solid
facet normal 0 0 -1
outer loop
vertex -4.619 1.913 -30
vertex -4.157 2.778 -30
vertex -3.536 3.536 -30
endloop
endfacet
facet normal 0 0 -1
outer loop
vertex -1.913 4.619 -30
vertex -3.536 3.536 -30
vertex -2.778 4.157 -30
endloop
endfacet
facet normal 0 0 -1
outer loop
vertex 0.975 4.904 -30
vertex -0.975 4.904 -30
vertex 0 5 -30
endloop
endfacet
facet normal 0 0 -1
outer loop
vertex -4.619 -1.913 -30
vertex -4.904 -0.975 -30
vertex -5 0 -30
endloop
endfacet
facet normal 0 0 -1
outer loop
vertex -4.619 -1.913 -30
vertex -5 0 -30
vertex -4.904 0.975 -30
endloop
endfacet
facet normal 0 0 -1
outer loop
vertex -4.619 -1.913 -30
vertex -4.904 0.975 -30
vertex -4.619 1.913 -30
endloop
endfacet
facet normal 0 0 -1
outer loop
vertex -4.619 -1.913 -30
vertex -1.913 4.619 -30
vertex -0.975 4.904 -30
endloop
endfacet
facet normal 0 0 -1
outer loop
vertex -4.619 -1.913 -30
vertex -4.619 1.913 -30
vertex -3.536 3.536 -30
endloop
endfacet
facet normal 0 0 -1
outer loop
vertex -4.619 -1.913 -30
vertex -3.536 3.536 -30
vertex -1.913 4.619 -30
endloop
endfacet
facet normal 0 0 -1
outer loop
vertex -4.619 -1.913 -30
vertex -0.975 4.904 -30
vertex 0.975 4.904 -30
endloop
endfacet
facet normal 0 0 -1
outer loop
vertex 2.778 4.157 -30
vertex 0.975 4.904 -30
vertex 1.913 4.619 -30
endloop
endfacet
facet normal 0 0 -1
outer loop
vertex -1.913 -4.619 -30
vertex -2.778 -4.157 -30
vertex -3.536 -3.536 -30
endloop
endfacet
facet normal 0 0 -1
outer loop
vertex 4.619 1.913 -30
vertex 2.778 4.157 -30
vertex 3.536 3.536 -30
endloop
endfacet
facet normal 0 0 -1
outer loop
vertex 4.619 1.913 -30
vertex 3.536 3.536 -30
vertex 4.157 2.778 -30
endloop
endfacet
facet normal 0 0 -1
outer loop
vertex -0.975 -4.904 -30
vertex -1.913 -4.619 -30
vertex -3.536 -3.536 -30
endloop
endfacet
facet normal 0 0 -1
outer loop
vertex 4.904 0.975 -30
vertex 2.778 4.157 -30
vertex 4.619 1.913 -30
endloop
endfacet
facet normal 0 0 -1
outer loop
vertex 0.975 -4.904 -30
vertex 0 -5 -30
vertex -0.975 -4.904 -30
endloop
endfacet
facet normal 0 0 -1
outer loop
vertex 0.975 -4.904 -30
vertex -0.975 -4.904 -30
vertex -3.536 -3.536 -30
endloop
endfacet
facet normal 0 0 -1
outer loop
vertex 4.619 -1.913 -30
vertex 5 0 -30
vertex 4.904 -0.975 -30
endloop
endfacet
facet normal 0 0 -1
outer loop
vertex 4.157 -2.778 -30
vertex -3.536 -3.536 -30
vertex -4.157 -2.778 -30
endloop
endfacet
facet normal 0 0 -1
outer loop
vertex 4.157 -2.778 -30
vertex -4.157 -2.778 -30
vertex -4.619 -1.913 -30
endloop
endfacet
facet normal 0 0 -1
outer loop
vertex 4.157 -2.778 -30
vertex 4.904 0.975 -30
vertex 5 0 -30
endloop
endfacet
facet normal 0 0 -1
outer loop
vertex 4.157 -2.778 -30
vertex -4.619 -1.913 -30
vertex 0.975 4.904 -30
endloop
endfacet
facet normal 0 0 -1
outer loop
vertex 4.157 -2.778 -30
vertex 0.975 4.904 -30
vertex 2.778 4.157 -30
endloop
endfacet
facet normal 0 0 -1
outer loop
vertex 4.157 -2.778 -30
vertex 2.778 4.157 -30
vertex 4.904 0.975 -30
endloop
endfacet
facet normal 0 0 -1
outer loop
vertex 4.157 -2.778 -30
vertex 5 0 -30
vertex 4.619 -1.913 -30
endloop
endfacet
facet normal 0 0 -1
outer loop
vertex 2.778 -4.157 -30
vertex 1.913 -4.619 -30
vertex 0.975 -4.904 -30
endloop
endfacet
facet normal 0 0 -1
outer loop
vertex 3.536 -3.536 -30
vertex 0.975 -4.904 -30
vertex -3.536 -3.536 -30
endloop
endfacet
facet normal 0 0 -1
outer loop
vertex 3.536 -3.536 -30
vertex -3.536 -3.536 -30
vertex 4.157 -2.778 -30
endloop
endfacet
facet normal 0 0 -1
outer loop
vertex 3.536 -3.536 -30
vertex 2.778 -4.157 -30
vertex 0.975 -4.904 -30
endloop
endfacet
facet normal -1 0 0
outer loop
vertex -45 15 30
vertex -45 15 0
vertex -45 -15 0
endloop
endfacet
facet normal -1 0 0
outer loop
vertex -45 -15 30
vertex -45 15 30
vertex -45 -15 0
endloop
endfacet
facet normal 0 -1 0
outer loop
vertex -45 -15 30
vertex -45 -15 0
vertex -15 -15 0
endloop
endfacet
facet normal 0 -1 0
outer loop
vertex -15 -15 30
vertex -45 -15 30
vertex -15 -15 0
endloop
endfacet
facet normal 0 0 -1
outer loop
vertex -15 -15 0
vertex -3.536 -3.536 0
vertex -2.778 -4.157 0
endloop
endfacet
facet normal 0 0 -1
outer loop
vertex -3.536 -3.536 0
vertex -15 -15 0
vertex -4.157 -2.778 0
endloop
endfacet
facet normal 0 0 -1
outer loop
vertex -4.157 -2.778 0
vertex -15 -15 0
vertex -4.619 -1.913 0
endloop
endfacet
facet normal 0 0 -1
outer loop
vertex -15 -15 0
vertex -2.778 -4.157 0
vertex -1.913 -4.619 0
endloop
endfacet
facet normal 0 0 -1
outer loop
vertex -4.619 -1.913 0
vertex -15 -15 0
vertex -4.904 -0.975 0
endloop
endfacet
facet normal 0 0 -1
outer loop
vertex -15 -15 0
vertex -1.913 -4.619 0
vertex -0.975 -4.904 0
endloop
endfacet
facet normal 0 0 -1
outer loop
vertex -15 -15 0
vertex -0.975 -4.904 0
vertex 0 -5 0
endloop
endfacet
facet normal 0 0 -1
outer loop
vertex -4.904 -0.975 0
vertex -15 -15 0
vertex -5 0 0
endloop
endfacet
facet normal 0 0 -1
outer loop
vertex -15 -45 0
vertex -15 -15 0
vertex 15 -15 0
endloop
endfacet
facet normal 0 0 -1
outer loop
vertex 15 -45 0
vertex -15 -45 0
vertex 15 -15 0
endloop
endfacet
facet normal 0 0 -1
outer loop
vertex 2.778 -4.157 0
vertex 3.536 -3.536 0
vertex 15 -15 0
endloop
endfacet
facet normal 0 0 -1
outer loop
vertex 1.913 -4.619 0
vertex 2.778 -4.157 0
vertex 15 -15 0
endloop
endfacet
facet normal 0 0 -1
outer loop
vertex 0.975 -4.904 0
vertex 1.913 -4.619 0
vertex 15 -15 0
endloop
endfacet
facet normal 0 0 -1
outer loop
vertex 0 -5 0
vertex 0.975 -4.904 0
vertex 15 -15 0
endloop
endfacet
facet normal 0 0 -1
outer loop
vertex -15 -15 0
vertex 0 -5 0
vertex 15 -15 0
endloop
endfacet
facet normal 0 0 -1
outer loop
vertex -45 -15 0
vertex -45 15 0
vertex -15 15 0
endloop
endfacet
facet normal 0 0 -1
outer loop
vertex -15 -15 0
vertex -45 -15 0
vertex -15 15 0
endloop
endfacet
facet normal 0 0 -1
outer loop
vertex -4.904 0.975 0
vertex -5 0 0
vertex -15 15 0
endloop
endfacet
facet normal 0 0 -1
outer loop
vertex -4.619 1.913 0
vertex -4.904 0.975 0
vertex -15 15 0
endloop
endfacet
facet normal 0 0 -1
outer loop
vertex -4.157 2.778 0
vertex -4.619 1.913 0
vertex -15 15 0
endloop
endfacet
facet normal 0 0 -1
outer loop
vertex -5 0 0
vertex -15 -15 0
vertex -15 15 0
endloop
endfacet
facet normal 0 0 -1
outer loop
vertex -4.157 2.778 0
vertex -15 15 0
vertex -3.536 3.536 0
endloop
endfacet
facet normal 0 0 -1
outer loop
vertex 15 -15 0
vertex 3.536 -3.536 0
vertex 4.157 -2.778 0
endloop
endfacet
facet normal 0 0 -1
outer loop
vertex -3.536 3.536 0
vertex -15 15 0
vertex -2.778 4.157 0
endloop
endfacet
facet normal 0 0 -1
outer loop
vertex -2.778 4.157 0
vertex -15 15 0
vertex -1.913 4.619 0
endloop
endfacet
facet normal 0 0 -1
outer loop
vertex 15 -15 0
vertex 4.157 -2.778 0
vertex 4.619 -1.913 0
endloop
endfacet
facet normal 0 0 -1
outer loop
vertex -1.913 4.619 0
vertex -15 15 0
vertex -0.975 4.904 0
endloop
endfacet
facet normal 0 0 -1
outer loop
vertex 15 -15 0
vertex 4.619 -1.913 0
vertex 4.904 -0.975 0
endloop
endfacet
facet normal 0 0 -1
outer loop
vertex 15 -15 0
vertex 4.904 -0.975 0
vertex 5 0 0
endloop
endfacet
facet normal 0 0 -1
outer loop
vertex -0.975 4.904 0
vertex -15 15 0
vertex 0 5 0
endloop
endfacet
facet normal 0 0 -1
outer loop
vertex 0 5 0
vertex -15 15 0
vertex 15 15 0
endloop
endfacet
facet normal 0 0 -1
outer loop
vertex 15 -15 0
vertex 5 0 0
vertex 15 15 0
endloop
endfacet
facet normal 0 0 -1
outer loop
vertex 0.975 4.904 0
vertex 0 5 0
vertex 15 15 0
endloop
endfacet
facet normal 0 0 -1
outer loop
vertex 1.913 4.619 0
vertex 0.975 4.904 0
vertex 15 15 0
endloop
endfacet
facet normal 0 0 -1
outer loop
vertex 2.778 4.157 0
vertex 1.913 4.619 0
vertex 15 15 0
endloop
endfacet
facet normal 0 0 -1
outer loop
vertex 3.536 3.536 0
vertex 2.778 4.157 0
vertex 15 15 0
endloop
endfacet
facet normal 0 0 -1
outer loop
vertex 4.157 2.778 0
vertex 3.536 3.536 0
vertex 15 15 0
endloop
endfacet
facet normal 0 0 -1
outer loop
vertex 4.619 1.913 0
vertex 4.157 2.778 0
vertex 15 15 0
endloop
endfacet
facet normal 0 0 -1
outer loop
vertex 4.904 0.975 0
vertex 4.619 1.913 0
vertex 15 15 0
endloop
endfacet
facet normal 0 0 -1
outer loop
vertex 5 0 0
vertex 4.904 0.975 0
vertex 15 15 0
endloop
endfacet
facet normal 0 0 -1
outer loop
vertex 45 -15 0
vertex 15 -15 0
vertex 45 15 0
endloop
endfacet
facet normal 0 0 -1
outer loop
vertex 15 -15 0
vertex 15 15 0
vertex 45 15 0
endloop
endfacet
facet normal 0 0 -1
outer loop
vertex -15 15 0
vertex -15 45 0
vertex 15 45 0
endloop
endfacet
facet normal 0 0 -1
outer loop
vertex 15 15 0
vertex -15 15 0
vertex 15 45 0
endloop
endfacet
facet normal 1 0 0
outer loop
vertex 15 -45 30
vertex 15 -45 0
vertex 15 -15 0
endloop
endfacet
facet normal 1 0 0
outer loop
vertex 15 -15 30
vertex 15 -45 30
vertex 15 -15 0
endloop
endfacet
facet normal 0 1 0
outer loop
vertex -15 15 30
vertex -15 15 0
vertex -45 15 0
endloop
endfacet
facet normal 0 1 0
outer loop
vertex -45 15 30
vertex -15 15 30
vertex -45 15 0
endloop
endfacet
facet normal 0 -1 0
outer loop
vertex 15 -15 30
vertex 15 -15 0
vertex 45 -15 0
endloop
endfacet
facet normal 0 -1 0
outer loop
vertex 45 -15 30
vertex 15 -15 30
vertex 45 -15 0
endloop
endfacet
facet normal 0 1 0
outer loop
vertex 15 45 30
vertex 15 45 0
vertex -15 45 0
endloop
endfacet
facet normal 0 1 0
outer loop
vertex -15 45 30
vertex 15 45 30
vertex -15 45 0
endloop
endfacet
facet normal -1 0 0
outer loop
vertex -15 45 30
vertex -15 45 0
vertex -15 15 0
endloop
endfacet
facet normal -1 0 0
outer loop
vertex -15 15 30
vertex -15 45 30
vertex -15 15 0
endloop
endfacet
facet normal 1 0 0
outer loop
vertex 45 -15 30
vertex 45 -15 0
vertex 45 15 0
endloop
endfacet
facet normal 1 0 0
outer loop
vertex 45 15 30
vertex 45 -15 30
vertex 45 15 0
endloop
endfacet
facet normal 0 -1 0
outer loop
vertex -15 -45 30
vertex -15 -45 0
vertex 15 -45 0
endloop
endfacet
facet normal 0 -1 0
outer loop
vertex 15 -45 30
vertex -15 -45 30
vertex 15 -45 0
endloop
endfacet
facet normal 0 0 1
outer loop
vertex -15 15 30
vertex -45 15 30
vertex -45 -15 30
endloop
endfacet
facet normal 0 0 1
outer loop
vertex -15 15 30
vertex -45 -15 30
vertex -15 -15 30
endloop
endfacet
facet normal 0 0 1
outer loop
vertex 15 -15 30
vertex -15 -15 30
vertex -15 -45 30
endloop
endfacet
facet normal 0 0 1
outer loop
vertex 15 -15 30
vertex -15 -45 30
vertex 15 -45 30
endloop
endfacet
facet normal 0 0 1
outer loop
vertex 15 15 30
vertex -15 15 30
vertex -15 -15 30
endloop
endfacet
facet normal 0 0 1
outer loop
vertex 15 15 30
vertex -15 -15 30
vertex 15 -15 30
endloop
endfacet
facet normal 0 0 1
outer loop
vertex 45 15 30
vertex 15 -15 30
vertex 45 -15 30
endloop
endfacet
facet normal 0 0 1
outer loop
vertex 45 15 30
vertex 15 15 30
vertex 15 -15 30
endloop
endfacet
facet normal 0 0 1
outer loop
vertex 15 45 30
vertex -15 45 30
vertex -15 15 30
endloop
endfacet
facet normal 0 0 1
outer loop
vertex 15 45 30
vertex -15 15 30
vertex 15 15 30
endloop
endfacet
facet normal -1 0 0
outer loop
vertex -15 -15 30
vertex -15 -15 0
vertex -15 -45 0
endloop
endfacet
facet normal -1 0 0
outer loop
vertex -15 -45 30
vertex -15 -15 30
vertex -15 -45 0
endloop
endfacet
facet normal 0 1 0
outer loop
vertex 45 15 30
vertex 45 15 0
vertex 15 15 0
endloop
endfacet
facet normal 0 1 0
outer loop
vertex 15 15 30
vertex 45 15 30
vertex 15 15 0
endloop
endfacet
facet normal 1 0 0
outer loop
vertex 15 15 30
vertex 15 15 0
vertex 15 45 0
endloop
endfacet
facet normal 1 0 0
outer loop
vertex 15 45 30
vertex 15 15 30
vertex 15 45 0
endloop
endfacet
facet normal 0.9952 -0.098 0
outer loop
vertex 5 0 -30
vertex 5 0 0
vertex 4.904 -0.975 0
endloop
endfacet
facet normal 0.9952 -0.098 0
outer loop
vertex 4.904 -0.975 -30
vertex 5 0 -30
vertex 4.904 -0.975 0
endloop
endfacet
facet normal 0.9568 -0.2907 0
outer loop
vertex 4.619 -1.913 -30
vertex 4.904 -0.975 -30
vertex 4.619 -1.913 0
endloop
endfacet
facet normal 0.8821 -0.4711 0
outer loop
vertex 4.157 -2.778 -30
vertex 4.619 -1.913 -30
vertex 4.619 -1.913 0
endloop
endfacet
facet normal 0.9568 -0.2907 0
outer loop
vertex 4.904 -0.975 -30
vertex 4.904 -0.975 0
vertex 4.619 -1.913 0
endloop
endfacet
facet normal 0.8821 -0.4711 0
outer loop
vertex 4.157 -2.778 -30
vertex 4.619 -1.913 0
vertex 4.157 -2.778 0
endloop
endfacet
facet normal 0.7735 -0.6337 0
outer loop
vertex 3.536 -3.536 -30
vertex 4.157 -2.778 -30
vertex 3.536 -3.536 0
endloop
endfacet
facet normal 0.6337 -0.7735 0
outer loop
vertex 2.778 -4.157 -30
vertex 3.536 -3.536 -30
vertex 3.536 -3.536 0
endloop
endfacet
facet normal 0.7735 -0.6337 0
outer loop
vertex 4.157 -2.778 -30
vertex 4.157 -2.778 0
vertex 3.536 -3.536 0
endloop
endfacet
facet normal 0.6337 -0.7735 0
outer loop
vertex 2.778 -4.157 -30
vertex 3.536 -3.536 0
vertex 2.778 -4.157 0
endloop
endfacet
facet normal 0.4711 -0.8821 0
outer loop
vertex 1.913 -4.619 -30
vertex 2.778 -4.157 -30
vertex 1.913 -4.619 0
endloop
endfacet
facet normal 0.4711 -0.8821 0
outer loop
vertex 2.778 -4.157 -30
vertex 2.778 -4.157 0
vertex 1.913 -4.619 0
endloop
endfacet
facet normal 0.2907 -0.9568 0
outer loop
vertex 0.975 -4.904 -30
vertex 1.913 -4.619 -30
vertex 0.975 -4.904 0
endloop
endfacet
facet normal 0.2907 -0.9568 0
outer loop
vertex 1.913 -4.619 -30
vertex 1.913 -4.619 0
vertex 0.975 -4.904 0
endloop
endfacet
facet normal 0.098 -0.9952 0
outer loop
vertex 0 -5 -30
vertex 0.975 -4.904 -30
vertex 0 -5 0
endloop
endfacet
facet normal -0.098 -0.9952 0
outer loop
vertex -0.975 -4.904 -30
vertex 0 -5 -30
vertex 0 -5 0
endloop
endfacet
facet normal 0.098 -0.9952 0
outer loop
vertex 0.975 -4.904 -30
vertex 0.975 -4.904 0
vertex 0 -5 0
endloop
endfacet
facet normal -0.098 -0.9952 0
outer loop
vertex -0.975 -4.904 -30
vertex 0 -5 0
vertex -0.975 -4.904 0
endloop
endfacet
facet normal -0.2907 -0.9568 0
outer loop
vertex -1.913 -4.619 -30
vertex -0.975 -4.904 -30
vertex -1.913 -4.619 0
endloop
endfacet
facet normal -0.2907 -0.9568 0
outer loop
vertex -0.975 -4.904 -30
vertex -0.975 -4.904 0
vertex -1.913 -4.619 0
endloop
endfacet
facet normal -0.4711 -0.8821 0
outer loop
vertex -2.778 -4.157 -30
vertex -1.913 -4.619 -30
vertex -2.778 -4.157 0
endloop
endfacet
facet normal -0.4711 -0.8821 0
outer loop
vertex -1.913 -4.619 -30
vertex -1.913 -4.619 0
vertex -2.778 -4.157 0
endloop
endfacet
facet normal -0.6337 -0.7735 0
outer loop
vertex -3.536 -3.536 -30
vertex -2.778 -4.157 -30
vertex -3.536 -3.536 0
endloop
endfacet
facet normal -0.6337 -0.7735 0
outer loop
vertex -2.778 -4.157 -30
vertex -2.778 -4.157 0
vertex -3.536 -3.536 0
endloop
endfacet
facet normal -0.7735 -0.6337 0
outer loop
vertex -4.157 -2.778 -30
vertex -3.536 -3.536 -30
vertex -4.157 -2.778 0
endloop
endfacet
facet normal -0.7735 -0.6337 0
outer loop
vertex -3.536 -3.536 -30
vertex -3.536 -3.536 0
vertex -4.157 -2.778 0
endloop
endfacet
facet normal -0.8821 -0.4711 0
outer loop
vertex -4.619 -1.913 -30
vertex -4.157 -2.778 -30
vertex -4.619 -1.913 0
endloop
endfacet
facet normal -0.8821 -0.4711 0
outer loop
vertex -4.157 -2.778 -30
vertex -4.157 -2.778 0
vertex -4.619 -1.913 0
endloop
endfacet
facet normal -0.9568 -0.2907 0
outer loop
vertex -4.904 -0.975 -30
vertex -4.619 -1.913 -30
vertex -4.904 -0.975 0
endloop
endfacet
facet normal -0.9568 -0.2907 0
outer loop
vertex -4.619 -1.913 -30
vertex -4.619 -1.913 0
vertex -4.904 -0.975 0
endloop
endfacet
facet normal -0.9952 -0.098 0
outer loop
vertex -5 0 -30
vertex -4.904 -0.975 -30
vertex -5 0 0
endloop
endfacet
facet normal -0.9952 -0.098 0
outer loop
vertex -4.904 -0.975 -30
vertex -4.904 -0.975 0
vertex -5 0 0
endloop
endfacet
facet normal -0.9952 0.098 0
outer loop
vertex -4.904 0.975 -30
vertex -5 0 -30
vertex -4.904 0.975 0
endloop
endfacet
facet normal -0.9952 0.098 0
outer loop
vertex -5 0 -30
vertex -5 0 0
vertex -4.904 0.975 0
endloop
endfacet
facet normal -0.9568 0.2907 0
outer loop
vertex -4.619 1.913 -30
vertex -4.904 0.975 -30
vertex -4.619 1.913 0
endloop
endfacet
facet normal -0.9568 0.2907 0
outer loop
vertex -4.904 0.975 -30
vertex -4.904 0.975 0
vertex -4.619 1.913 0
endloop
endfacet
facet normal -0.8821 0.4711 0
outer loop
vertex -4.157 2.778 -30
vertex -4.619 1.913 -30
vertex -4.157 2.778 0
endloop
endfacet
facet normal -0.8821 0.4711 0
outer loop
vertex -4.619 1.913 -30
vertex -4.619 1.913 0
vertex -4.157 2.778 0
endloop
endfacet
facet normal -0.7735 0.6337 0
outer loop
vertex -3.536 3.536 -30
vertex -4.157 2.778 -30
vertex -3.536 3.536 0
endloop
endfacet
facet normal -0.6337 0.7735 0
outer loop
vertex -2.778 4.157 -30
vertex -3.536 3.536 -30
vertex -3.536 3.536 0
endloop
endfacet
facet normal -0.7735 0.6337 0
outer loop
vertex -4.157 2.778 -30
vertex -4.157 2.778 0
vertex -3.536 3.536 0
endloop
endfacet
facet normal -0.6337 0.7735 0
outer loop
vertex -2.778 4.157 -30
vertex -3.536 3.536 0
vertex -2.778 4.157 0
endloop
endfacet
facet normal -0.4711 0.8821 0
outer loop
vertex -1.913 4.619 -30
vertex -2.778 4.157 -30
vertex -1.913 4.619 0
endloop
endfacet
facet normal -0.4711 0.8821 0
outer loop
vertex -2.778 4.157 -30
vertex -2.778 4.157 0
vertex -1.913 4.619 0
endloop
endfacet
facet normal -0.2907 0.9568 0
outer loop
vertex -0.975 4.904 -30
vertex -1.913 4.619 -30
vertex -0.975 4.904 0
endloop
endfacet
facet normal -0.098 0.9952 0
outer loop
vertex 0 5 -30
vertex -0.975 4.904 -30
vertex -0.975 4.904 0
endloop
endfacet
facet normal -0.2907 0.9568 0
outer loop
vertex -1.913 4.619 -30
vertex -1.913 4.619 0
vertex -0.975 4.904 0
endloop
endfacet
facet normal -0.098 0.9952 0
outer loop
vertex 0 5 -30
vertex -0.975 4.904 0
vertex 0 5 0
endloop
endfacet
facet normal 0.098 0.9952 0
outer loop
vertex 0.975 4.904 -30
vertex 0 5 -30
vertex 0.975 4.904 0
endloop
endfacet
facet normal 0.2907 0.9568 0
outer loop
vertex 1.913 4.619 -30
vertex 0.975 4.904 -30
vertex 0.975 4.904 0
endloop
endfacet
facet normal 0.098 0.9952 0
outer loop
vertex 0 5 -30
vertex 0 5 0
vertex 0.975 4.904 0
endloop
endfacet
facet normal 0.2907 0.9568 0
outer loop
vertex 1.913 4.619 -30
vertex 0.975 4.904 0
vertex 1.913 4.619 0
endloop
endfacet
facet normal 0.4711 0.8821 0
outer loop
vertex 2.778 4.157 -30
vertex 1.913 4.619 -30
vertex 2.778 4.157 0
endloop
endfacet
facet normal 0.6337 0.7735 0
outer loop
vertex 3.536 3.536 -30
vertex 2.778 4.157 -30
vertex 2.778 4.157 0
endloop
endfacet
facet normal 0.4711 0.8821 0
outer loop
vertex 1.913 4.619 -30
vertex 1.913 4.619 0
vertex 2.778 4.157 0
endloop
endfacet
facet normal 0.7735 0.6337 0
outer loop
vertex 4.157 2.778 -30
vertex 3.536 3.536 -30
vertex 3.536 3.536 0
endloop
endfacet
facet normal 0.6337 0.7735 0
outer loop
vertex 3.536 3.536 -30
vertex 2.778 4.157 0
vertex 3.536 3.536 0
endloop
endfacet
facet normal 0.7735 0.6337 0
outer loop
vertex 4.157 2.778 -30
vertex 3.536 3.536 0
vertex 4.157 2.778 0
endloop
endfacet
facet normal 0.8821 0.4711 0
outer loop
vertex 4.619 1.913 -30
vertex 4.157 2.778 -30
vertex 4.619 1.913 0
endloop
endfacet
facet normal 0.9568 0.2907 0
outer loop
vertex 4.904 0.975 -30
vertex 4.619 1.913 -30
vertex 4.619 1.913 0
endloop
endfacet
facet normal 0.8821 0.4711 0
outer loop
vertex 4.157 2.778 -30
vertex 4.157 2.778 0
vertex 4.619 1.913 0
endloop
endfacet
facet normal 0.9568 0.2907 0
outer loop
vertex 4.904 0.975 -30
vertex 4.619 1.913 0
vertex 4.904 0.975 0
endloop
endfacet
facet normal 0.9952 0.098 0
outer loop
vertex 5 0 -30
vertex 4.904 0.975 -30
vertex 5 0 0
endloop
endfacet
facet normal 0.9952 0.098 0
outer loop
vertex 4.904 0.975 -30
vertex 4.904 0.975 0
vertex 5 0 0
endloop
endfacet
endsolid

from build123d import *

# Parameters (mm, degrees)
F1_DEPTH = 30
F2_R     = 5
F3_DEPTH = 30


with BuildPart() as f1:
    # F0 (on Top) → F1 (new body)
    with BuildSketch(Plane.XY):
        Polygon((45, -15), (45, 0), (45, 15), (15, 15), (15, 45), (0, 45), (-15, 45), (-15, 15), (-45, 15), (-45, 0), (-45, -15), (-15, -15), (-15, -45), (0, -45), (15, -45), (15, -15), align=None)
    extrude(amount=F1_DEPTH)

    # F2 (on face) → F3 (join)
    with BuildSketch(Plane(origin=(0, 0, 0), x_dir=(1, 0, 0), z_dir=(0, 0, -1))):
        Circle(F2_R)
    extrude(amount=F3_DEPTH)


solid = f1.part
